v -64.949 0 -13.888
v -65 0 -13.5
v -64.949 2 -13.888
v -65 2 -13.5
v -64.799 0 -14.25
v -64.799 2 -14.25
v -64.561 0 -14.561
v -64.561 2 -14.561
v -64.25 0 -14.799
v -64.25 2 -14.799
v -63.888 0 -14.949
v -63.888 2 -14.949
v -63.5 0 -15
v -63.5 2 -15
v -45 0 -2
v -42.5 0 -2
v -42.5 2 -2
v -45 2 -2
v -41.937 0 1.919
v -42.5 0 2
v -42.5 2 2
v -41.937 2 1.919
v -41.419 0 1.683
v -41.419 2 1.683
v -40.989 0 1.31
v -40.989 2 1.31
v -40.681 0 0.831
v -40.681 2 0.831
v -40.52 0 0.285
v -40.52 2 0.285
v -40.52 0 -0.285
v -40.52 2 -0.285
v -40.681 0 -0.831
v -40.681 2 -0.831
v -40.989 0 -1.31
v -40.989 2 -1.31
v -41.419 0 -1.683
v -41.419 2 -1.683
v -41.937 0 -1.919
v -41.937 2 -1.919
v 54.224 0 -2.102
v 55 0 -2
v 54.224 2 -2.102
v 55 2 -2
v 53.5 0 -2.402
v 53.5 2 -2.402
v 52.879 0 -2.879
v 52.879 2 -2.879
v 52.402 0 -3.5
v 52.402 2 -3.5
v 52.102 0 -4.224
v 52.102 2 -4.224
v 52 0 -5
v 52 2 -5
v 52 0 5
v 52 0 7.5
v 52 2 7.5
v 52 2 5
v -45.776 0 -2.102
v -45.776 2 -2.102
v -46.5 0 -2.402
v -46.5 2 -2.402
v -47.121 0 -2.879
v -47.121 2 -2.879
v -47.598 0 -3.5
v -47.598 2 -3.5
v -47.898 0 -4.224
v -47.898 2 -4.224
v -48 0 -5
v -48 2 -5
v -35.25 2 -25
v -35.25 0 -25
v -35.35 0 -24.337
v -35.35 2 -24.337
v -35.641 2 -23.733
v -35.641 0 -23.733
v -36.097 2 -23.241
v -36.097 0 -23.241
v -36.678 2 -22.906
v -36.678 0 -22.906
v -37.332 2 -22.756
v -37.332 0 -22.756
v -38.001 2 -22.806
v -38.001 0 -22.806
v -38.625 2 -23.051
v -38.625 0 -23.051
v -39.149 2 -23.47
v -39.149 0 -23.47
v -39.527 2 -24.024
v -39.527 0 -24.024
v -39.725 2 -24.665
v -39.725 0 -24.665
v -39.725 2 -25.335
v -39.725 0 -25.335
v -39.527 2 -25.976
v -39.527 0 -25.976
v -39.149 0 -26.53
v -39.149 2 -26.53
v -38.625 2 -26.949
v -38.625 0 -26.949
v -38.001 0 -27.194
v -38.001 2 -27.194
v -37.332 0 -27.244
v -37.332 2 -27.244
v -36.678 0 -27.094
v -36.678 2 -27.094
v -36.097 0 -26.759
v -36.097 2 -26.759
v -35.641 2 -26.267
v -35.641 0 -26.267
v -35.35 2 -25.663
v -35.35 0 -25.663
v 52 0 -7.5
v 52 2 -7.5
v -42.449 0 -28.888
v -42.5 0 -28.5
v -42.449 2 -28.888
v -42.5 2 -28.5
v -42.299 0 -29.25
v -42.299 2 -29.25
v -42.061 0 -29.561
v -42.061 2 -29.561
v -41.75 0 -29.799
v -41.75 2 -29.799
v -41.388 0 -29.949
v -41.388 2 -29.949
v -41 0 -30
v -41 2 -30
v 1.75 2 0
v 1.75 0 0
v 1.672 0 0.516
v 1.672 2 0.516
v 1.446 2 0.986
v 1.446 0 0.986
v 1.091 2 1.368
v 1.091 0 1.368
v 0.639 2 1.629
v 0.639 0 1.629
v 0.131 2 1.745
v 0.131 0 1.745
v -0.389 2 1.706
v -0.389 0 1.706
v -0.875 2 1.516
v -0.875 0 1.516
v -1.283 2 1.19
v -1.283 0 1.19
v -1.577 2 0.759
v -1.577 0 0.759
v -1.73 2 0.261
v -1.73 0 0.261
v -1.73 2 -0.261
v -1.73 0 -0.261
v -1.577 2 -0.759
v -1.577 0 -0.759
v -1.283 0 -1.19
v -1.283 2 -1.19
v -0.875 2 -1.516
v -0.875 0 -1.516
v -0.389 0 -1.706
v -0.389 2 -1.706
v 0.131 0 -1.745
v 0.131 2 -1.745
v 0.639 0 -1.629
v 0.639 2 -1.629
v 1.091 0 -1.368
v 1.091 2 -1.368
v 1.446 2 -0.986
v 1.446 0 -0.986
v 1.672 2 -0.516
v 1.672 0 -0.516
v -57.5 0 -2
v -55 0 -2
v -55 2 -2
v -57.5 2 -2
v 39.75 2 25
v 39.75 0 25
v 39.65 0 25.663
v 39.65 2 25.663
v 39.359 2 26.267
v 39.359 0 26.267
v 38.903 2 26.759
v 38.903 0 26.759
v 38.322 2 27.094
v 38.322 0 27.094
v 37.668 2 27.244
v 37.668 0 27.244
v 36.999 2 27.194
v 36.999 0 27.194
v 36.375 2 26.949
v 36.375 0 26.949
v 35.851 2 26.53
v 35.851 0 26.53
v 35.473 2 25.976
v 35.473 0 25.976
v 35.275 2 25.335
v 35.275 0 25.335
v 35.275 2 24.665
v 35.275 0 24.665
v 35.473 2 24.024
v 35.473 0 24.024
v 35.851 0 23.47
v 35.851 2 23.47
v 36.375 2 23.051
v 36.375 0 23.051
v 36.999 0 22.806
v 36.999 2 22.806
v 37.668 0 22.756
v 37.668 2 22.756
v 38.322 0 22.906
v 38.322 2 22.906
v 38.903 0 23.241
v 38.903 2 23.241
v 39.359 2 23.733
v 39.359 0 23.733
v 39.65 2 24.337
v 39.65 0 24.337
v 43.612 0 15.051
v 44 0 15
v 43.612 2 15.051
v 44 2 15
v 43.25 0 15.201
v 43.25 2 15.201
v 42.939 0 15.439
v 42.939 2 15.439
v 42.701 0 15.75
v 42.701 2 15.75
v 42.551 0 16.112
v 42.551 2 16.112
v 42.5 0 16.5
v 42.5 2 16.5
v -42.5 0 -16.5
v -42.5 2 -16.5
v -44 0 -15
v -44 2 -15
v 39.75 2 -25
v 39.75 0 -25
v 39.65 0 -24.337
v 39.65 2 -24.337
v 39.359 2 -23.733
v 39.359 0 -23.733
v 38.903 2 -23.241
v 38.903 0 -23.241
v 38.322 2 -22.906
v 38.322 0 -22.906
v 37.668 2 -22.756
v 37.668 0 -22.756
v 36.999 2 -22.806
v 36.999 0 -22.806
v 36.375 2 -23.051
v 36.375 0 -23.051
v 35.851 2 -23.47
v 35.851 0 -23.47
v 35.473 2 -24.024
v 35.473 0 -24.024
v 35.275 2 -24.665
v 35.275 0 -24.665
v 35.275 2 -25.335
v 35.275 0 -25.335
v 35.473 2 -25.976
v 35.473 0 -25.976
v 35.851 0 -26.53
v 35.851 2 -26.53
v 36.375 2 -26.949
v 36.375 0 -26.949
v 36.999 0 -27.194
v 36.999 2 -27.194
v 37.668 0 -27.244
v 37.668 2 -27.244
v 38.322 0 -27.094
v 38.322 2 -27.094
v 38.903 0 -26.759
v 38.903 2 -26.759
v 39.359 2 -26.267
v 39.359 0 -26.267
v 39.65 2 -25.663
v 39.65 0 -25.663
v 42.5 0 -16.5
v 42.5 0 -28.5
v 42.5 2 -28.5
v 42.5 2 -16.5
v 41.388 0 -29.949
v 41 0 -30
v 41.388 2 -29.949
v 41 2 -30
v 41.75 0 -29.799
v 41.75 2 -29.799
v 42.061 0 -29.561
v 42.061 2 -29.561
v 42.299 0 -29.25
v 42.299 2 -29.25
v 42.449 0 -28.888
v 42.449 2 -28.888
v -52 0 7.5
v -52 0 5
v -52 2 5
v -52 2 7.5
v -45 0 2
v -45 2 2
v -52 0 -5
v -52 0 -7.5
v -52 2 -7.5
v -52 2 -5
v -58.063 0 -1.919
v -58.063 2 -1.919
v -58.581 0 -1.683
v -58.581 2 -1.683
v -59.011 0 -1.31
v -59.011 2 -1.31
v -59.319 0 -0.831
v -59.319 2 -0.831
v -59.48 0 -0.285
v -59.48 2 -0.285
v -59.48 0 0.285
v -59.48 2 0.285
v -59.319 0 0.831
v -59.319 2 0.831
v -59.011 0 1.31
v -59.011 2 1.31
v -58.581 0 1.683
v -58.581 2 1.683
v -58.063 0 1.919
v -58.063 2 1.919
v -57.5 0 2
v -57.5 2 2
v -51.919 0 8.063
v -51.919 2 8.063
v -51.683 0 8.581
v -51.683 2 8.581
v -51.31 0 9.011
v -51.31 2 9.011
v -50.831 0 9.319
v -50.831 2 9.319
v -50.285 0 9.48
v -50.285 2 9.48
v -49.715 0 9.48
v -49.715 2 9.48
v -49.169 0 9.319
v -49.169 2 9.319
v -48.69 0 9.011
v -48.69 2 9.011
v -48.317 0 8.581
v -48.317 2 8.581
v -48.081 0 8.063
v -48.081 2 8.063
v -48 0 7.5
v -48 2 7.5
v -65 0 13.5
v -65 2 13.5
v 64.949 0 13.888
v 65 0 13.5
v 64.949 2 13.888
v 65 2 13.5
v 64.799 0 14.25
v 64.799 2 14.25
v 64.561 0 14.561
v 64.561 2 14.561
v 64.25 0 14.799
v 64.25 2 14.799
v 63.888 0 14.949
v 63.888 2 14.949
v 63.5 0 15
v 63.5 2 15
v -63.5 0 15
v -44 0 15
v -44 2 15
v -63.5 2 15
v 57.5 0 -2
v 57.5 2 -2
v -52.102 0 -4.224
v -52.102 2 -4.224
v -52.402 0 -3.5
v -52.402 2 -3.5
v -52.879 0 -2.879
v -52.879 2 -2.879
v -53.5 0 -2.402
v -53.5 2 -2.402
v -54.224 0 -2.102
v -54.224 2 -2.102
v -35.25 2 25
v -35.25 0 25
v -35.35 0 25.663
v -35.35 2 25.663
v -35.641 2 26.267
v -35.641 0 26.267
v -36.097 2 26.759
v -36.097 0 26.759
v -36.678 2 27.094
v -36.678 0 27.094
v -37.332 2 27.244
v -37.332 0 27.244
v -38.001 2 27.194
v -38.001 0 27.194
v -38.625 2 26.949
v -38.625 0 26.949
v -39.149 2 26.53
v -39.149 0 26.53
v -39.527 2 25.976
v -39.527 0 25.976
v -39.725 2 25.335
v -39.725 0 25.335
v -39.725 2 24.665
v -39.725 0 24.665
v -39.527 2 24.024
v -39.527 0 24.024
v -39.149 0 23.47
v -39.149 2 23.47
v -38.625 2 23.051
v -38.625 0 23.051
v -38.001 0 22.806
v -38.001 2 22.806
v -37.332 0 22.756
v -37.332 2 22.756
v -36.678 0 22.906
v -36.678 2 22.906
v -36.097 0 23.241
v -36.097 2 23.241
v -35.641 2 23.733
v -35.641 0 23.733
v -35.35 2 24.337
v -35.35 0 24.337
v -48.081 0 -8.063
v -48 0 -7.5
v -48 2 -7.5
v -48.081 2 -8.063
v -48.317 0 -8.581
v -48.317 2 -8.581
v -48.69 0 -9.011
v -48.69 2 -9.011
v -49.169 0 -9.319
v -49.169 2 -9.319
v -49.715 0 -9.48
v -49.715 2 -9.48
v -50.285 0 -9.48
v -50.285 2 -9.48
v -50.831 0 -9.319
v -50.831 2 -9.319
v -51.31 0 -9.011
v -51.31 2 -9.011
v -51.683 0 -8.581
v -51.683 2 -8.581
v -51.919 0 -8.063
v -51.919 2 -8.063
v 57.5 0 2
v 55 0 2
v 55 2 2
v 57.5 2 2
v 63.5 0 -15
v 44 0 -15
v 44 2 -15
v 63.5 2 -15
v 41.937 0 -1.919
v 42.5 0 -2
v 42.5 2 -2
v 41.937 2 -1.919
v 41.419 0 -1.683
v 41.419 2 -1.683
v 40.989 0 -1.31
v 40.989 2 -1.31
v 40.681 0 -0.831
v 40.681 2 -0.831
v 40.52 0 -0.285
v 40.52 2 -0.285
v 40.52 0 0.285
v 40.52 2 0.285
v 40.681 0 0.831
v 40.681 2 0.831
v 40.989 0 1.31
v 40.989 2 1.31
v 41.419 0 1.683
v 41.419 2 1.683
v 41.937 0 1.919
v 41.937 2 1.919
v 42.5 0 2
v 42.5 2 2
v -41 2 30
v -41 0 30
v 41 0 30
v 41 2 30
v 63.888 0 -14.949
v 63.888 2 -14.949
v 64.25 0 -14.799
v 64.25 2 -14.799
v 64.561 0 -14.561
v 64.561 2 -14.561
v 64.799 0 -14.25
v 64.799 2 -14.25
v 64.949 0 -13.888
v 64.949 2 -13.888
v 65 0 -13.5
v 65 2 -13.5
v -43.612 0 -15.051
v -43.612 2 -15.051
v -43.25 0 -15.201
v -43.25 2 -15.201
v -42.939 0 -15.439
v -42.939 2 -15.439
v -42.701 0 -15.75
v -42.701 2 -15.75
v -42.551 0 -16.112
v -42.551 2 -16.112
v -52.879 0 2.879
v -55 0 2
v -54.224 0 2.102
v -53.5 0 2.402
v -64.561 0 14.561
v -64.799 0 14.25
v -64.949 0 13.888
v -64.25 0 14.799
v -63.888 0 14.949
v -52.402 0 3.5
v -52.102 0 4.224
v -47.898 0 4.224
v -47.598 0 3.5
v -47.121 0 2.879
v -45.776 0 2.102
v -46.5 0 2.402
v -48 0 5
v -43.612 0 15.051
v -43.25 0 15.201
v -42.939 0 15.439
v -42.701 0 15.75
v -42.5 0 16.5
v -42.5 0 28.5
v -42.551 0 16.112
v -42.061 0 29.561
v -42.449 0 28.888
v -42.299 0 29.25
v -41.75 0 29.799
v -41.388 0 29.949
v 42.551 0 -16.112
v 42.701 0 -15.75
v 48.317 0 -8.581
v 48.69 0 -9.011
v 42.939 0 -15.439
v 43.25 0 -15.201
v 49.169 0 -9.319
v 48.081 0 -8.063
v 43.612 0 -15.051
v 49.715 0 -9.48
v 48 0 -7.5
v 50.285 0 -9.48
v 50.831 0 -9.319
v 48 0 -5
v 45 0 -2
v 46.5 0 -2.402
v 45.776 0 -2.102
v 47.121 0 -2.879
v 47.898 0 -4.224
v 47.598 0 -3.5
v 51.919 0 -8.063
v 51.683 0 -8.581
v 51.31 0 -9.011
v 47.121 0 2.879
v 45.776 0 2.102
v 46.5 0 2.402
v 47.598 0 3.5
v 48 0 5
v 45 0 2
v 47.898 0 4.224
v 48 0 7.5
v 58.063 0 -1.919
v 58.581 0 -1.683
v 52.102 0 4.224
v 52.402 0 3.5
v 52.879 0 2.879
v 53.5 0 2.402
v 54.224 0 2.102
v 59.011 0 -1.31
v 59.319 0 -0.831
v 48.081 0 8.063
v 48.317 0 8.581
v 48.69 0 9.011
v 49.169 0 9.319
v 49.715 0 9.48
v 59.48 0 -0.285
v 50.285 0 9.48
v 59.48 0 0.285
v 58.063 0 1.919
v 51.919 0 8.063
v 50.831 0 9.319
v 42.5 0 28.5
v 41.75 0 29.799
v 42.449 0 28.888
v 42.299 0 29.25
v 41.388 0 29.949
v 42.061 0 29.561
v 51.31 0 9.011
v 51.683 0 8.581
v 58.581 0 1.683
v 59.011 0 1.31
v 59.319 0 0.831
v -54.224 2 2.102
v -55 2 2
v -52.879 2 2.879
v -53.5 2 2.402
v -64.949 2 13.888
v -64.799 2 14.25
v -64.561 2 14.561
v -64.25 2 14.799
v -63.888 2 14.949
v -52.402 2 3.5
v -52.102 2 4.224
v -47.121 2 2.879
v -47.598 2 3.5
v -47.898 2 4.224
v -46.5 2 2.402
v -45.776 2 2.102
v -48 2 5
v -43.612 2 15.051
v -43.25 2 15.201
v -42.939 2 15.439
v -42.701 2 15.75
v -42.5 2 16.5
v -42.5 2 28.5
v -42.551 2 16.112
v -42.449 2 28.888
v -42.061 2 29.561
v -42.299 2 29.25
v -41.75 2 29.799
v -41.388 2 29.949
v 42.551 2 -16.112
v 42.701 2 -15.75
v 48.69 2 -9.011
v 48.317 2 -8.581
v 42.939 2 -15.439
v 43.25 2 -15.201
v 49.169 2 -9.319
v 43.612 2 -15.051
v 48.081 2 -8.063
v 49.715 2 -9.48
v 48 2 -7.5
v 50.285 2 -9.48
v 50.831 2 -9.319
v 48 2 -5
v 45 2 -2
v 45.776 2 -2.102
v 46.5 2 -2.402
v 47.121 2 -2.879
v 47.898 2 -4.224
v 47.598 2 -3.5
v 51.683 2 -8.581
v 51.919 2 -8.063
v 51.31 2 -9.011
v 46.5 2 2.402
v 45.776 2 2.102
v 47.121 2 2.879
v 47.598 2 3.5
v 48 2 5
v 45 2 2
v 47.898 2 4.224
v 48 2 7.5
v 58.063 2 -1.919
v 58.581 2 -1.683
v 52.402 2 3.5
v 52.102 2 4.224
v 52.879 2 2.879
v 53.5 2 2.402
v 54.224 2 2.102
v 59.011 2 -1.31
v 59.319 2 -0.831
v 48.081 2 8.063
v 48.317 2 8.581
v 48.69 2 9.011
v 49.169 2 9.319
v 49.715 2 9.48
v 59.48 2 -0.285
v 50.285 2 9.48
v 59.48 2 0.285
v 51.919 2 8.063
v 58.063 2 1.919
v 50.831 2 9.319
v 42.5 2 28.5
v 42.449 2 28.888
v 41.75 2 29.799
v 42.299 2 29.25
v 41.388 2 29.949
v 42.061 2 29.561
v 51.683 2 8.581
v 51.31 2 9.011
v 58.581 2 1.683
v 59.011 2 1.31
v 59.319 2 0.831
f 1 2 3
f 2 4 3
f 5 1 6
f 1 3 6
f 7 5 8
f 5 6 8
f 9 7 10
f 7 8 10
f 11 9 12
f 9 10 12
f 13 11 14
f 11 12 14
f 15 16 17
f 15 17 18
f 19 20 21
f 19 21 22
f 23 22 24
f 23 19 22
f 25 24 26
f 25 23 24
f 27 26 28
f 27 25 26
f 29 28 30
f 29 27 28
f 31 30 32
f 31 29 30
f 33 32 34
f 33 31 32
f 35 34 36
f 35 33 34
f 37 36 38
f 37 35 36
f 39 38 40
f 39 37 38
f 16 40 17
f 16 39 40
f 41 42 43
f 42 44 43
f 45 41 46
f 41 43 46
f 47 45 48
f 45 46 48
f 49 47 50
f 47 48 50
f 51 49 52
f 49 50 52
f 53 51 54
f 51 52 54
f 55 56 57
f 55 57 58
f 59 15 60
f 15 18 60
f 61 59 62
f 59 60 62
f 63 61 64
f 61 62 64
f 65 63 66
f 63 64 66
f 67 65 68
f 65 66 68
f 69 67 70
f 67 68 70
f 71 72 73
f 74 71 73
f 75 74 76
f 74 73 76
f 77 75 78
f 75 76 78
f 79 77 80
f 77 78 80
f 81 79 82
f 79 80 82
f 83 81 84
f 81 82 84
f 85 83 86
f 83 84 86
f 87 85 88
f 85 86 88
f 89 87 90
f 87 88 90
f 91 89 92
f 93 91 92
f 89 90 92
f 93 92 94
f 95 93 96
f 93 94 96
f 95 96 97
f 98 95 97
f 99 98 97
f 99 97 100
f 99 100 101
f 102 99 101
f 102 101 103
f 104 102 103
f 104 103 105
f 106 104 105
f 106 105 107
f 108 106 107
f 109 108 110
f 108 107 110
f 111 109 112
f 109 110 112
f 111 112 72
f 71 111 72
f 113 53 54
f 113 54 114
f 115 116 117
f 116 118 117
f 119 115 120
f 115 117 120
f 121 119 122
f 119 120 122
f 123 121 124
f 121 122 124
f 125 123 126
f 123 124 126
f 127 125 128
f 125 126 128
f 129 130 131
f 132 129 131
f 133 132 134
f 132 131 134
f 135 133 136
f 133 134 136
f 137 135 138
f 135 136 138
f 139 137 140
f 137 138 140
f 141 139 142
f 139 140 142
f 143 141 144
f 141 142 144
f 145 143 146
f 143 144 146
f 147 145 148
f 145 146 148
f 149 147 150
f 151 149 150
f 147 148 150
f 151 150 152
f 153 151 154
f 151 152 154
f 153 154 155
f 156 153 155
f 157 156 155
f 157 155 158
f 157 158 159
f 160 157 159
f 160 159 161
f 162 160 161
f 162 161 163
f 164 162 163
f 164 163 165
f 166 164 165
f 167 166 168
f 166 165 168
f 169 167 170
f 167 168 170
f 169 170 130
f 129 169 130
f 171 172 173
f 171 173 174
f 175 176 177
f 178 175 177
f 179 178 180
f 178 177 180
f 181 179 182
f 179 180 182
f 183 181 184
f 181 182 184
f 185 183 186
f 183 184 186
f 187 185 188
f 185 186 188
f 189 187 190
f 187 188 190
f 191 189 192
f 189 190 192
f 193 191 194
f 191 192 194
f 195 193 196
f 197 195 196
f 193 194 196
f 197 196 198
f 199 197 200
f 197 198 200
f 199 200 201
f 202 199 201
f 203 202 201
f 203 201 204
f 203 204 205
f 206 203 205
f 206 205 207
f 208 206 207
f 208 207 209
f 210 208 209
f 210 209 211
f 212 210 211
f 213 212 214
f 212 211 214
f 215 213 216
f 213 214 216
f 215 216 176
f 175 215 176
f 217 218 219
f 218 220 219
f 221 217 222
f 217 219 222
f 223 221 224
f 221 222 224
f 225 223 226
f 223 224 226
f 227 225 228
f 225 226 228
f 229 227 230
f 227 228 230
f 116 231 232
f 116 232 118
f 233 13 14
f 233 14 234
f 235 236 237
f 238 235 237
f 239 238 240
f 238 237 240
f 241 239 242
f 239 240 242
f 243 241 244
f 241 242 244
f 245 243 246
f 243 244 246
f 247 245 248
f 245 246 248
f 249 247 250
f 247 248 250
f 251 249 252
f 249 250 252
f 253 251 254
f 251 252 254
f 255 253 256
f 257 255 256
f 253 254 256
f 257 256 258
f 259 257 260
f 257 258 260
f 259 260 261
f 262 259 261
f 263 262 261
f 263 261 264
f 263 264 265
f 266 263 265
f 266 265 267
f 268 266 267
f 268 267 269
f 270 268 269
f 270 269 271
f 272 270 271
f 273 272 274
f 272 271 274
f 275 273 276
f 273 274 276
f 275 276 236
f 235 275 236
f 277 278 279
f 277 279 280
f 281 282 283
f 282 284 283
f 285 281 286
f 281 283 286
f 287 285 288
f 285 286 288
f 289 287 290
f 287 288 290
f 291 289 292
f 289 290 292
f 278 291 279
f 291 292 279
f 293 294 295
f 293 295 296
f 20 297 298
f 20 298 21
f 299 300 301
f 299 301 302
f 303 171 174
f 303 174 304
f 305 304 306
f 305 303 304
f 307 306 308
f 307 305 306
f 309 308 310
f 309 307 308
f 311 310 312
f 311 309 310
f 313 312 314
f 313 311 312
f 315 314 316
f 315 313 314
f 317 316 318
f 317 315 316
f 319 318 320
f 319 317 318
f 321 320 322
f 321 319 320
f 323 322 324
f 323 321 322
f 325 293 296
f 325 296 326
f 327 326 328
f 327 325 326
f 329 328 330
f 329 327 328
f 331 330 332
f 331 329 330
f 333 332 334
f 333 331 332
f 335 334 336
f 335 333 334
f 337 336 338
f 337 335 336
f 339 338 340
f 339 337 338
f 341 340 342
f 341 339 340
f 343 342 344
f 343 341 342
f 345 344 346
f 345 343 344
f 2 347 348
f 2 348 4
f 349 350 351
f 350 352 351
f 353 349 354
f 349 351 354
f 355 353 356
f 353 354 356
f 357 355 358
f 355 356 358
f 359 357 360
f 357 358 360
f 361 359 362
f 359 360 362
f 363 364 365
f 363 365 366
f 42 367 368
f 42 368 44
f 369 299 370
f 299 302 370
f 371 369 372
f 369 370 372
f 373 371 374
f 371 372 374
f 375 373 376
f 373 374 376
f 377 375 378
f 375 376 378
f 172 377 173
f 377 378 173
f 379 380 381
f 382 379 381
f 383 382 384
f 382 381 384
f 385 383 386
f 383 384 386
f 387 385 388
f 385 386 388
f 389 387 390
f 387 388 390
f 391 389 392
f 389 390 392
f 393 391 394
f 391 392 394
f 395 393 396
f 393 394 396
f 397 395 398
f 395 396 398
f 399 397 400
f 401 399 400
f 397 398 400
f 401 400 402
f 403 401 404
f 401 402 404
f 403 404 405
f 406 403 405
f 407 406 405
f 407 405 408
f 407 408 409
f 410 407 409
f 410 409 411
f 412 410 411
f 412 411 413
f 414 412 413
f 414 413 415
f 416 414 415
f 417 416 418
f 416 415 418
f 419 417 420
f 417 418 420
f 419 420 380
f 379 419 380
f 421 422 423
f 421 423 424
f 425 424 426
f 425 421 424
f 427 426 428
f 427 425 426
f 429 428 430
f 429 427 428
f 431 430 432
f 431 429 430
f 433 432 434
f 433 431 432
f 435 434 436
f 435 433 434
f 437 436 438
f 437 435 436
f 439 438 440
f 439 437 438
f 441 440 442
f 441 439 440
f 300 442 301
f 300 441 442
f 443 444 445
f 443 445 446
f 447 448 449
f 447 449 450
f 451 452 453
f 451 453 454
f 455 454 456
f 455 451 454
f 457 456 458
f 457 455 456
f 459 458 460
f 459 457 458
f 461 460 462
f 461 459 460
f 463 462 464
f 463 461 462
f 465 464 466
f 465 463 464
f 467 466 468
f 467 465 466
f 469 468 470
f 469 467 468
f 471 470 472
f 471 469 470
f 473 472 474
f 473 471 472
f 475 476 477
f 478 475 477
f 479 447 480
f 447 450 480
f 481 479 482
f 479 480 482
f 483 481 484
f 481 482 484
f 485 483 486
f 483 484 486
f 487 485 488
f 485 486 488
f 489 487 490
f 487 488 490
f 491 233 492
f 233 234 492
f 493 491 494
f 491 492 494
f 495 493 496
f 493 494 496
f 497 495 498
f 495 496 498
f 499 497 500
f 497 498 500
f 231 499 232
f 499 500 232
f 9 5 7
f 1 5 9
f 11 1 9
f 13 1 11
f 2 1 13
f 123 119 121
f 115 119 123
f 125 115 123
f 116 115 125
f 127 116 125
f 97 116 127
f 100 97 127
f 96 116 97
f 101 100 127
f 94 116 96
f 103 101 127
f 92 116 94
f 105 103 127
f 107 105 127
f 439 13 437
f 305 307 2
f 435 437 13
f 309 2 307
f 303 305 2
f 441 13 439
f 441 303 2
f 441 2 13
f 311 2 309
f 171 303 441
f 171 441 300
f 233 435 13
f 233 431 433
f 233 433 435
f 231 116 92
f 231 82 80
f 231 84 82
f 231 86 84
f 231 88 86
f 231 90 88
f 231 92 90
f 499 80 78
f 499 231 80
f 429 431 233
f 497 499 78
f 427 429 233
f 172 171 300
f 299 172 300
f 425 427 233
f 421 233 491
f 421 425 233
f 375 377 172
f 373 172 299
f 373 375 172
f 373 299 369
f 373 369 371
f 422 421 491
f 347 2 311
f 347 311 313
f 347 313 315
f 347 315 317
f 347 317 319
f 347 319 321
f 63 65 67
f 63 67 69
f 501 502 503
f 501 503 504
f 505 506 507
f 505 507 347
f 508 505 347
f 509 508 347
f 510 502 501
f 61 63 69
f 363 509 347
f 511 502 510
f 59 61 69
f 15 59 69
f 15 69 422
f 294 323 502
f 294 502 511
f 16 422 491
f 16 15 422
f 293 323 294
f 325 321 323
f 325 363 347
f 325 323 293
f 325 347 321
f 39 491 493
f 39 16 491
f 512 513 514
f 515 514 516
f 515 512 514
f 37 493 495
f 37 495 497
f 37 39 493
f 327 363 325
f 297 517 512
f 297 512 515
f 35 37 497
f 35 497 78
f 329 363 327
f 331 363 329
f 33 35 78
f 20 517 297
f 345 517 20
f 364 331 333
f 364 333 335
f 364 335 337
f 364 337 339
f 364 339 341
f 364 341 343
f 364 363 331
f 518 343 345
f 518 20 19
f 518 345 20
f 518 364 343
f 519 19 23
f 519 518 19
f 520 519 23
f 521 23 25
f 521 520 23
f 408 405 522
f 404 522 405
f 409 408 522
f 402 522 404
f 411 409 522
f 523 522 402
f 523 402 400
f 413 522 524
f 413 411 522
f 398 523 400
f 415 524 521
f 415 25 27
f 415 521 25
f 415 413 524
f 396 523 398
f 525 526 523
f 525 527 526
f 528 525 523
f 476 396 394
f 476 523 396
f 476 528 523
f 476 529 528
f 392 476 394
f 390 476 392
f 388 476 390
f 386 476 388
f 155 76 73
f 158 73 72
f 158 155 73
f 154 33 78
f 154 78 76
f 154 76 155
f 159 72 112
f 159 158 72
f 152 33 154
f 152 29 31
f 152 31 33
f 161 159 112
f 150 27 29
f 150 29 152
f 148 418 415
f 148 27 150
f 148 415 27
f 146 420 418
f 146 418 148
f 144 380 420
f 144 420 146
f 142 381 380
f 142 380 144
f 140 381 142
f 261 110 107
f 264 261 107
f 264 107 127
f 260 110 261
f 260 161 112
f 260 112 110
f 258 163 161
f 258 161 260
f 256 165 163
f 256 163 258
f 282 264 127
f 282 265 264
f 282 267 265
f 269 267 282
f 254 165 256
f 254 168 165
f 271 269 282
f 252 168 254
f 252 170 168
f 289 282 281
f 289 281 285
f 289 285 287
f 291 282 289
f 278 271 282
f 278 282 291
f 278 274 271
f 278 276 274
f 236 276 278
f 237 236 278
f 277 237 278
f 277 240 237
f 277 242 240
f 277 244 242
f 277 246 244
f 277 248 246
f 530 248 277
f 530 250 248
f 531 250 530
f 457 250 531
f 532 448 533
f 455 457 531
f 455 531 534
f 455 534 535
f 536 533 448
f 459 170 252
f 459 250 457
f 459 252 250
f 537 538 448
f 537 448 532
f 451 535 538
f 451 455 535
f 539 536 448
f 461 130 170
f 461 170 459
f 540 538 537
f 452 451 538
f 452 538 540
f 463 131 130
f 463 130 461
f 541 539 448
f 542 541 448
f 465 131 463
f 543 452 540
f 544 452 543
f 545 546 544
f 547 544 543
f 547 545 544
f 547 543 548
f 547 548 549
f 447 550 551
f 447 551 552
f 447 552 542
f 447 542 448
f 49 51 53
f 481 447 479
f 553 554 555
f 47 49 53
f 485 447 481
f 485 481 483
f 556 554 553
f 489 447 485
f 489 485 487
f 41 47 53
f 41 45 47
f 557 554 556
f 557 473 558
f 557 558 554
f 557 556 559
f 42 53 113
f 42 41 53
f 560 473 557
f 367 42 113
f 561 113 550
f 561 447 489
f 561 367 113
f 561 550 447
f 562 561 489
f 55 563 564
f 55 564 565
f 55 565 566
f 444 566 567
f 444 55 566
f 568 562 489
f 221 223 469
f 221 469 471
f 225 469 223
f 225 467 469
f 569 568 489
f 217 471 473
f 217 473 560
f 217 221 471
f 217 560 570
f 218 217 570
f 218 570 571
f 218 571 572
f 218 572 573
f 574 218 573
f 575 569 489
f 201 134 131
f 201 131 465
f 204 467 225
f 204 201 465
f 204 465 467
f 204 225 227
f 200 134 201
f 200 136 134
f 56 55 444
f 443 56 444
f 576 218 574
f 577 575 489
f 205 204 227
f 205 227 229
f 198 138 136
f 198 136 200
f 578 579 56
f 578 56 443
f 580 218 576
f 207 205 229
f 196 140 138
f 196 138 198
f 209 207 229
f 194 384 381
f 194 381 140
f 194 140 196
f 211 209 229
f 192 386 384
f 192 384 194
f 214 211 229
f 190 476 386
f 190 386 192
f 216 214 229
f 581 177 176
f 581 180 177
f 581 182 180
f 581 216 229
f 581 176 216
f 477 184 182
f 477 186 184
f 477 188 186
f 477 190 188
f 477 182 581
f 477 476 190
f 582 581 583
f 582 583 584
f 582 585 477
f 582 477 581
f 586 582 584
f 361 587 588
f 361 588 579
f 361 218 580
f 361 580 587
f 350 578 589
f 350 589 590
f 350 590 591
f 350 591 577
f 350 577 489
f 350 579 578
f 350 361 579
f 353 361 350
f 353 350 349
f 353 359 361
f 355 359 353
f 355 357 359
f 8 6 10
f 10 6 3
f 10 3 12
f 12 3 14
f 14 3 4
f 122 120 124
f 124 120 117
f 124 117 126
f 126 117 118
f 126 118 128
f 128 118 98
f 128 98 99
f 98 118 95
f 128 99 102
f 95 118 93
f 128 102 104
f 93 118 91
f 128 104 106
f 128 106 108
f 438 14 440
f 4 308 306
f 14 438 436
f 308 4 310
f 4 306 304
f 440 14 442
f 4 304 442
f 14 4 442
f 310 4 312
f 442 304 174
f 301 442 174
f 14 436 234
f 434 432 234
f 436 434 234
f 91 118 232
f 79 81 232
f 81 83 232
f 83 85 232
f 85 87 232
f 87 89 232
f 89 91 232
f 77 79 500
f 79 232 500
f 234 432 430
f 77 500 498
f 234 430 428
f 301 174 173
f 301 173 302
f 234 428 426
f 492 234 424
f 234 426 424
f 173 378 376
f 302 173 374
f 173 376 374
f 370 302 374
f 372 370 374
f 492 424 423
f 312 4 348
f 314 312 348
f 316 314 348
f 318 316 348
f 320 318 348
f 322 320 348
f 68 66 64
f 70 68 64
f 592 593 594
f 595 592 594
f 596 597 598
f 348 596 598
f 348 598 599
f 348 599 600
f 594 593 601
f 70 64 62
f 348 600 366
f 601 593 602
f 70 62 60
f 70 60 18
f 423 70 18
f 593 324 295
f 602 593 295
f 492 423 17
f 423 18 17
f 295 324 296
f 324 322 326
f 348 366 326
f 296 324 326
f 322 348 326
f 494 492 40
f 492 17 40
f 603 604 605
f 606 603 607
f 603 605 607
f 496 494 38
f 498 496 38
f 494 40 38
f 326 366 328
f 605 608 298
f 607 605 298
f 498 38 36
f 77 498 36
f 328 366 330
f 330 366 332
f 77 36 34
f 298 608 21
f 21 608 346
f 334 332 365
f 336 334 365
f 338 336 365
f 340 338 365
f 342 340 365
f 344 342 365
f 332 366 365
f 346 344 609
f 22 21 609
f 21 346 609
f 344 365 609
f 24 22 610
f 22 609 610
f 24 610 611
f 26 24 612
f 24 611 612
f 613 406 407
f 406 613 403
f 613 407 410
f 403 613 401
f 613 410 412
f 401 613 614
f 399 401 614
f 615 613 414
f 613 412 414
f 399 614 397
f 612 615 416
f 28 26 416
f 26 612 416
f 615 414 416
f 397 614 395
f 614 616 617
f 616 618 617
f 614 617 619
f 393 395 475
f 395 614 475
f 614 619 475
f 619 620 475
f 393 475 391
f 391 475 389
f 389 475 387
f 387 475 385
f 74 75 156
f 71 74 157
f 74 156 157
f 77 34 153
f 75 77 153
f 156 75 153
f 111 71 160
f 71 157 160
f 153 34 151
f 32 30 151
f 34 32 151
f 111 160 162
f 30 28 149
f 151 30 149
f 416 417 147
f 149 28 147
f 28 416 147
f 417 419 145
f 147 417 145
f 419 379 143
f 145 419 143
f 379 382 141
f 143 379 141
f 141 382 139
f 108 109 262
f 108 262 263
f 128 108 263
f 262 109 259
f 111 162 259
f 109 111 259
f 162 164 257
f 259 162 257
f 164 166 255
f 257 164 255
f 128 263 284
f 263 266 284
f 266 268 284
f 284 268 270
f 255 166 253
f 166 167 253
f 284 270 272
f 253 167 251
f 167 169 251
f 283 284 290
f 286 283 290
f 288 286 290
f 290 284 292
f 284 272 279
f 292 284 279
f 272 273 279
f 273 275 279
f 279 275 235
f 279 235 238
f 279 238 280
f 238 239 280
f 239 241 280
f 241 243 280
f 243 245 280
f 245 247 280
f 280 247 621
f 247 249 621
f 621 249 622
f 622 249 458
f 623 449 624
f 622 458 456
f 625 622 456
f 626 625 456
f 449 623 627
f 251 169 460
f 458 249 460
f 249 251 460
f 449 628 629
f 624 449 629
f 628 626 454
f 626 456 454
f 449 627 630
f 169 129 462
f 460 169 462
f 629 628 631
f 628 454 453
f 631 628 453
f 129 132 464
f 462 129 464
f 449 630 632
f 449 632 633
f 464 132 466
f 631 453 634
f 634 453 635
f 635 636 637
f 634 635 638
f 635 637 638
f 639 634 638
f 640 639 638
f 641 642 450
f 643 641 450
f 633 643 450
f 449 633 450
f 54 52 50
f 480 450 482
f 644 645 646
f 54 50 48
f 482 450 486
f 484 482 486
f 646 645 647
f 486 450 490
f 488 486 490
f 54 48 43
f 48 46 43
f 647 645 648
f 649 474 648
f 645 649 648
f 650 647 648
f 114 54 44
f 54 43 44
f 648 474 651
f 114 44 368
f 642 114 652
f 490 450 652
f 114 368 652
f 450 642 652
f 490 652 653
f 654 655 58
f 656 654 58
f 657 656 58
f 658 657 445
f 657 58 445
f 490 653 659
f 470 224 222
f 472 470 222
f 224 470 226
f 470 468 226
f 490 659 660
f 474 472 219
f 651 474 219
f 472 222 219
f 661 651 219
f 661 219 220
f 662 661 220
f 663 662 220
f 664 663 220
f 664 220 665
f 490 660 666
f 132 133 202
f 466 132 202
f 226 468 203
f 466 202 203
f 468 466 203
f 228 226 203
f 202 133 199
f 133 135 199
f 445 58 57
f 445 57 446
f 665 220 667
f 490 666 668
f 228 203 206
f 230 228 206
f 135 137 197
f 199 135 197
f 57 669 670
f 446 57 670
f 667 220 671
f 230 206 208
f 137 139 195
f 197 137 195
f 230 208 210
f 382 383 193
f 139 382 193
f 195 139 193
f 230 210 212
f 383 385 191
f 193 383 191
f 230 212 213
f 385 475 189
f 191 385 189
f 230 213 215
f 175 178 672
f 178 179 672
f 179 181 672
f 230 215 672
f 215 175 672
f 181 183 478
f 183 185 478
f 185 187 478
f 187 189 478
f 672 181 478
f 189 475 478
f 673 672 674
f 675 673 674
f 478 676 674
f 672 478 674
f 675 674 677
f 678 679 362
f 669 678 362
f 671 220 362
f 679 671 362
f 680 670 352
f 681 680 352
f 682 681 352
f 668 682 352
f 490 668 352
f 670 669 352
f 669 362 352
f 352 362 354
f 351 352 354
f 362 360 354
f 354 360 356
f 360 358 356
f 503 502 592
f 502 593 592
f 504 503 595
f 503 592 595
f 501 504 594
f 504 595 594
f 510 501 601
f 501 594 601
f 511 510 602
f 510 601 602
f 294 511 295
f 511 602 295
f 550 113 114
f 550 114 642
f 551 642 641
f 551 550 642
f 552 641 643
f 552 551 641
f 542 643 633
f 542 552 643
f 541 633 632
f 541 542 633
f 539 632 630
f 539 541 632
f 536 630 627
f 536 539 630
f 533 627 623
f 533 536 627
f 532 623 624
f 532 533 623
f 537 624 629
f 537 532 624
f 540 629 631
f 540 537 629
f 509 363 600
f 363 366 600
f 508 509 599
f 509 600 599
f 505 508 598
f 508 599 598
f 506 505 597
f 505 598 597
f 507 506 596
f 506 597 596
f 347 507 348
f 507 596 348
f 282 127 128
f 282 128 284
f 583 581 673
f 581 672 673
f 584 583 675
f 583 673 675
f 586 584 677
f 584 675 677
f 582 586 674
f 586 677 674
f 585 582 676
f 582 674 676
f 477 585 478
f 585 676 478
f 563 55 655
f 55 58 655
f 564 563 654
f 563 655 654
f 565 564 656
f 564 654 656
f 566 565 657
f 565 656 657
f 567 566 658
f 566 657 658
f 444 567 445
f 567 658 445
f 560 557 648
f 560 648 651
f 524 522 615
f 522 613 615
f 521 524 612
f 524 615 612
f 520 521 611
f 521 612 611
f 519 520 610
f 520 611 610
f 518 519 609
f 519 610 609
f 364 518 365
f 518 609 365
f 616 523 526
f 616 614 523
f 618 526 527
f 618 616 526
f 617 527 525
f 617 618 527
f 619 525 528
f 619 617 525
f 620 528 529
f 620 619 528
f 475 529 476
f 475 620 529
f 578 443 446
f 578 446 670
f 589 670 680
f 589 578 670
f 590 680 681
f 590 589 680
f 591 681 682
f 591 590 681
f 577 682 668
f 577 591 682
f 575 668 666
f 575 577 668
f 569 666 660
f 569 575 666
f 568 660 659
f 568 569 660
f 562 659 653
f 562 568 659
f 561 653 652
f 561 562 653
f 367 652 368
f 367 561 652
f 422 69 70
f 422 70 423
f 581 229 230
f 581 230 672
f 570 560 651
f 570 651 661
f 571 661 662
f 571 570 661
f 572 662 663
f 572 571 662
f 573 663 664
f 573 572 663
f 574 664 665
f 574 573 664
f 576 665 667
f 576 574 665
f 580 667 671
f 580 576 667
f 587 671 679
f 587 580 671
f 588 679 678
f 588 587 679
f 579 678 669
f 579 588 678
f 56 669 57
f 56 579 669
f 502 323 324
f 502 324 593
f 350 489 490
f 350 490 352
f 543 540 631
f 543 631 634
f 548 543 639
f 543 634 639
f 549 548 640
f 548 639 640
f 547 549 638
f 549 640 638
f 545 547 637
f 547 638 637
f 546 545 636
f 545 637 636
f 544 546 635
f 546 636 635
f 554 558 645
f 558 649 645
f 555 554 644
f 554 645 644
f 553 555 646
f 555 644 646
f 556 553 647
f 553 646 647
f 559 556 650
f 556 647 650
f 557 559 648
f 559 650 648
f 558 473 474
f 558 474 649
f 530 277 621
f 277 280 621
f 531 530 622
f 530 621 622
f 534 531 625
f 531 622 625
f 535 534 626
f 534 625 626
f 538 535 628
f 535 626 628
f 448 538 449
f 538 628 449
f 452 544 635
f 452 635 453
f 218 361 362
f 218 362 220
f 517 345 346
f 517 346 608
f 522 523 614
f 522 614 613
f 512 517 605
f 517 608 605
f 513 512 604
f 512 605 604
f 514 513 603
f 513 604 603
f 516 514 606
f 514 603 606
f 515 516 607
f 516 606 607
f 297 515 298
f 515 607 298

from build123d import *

# Parameters (mm, degrees)
F0_W     = 85
F0_H     = 15
F0_R     = 2.25
F0_R_2   = 1.75
F1_DEPTH = 2
F2_R     = 1.5
F3_R     = 3


# Not quite as in the source:
# - a feature names something its author has since deleted; it is built from what else it names


with BuildPart() as f1:
    # F0 (on Front) → F1 (new body)
    with BuildSketch(Plane.XZ):
        with Locations((0, 22.5)):
            Rectangle(F0_W, F0_H)
        with Locations((-37.5, 25)):
            Circle(F0_R, mode=Mode.SUBTRACT)
        with Locations((37.5, 25)):
            Circle(F0_R, mode=Mode.SUBTRACT)
        with Locations((0, -22.5)):
            Rectangle(F0_W, F0_H)
        with Locations((-37.5, -25)):
            Circle(F0_R, mode=Mode.SUBTRACT)
        with Locations((37.5, -25)):
            Circle(F0_R, mode=Mode.SUBTRACT)
        with BuildLine():
            Line((-42.5, -2), (-42.5, -15))
            Line((-42.5, -15), (42.5, -15))
            Line((42.5, -15), (42.5, -2))
            ThreePointArc((42.5, -2), (40.5, 0), (42.5, 2))
            Line((42.5, 2), (42.5, 15))
            Line((42.5, 15), (-42.5, 15))
            Line((-42.5, 15), (-42.5, 2))
            ThreePointArc((-42.5, 2), (-40.5, 0), (-42.5, -2))
        make_face()
        Circle(F0_R_2, mode=Mode.SUBTRACT)
        with BuildLine():
            Line((-65, -15), (-42.5, -15))
            Line((-42.5, -15), (-42.5, -2))
            Line((-42.5, -2), (-48, -2))
            Line((-48, -2), (-48, -7.5))
            ThreePointArc((-48, -7.5), (-50, -9.5), (-52, -7.5))
            Line((-52, -7.5), (-52, -2))
            Line((-52, -2), (-57.5, -2))
            ThreePointArc((-57.5, -2), (-59.5, 0), (-57.5, 2))
            Line((-57.5, 2), (-52, 2))
            Line((-52, 2), (-52, 7.5))
            ThreePointArc((-52, 7.5), (-50, 9.5), (-48, 7.5))
            Line((-48, 7.5), (-48, 2))
            Line((-48, 2), (-42.5, 2))
            Line((-42.5, 2), (-42.5, 15))
            Line((-42.5, 15), (-65, 15))
            Line((-65, 15), (-65, -15))
        make_face()
        with BuildLine():
            Line((42.5, -2), (42.5, -15))
            Line((42.5, -15), (65, -15))
            Line((65, -15), (65, 15))
            Line((65, 15), (42.5, 15))
            Line((42.5, 15), (42.5, 2))
            Line((42.5, 2), (48, 2))
            Line((48, 2), (48, 7.5))
            ThreePointArc((48, 7.5), (50, 9.5), (52, 7.5))
            Line((52, 7.5), (52, 2))
            Line((52, 2), (57.5, 2))
            ThreePointArc((57.5, 2), (59.5, 0), (57.5, -2))
            Line((57.5, -2), (52, -2))
            Line((52, -2), (52, -7.5))
            ThreePointArc((52, -7.5), (50, -9.5), (48, -7.5))
            Line((48, -7.5), (48, -2))
            Line((48, -2), (42.5, -2))
        make_face()
    extrude(amount=-F1_DEPTH)

    # F2
    f2_edges = [f1.edges().sort_by_distance(p)[0] for p in [
        (-42.5, 1, 30),
        (42.5, 1, 30),
        (42.5, 1, -30),
        (-42.5, 1, -30),
        (-42.5, 1, 15),
        (-65, 1, 15),
        (-65, 1, -15),
        (-42.5, 1, -15),
        (42.5, 1, 15),
        (65, 1, 15),
        (42.5, 1, -15),
        (65, 1, -15),
    ]]
    fillet(f2_edges, radius=F2_R)

    # F3
    f3_edges = [f1.edges().sort_by_distance(p)[0] for p in [
        (48, 1, 2),
        (52, 1, 2),
        (48, 1, -2),
        (52, 1, -2),
        (-48, 1, 2),
        (-52, 1, 2),
        (-48, 1, -2),
        (-52, 1, -2),
    ]]
    fillet(f3_edges, radius=F3_R)


solid = f1.part
